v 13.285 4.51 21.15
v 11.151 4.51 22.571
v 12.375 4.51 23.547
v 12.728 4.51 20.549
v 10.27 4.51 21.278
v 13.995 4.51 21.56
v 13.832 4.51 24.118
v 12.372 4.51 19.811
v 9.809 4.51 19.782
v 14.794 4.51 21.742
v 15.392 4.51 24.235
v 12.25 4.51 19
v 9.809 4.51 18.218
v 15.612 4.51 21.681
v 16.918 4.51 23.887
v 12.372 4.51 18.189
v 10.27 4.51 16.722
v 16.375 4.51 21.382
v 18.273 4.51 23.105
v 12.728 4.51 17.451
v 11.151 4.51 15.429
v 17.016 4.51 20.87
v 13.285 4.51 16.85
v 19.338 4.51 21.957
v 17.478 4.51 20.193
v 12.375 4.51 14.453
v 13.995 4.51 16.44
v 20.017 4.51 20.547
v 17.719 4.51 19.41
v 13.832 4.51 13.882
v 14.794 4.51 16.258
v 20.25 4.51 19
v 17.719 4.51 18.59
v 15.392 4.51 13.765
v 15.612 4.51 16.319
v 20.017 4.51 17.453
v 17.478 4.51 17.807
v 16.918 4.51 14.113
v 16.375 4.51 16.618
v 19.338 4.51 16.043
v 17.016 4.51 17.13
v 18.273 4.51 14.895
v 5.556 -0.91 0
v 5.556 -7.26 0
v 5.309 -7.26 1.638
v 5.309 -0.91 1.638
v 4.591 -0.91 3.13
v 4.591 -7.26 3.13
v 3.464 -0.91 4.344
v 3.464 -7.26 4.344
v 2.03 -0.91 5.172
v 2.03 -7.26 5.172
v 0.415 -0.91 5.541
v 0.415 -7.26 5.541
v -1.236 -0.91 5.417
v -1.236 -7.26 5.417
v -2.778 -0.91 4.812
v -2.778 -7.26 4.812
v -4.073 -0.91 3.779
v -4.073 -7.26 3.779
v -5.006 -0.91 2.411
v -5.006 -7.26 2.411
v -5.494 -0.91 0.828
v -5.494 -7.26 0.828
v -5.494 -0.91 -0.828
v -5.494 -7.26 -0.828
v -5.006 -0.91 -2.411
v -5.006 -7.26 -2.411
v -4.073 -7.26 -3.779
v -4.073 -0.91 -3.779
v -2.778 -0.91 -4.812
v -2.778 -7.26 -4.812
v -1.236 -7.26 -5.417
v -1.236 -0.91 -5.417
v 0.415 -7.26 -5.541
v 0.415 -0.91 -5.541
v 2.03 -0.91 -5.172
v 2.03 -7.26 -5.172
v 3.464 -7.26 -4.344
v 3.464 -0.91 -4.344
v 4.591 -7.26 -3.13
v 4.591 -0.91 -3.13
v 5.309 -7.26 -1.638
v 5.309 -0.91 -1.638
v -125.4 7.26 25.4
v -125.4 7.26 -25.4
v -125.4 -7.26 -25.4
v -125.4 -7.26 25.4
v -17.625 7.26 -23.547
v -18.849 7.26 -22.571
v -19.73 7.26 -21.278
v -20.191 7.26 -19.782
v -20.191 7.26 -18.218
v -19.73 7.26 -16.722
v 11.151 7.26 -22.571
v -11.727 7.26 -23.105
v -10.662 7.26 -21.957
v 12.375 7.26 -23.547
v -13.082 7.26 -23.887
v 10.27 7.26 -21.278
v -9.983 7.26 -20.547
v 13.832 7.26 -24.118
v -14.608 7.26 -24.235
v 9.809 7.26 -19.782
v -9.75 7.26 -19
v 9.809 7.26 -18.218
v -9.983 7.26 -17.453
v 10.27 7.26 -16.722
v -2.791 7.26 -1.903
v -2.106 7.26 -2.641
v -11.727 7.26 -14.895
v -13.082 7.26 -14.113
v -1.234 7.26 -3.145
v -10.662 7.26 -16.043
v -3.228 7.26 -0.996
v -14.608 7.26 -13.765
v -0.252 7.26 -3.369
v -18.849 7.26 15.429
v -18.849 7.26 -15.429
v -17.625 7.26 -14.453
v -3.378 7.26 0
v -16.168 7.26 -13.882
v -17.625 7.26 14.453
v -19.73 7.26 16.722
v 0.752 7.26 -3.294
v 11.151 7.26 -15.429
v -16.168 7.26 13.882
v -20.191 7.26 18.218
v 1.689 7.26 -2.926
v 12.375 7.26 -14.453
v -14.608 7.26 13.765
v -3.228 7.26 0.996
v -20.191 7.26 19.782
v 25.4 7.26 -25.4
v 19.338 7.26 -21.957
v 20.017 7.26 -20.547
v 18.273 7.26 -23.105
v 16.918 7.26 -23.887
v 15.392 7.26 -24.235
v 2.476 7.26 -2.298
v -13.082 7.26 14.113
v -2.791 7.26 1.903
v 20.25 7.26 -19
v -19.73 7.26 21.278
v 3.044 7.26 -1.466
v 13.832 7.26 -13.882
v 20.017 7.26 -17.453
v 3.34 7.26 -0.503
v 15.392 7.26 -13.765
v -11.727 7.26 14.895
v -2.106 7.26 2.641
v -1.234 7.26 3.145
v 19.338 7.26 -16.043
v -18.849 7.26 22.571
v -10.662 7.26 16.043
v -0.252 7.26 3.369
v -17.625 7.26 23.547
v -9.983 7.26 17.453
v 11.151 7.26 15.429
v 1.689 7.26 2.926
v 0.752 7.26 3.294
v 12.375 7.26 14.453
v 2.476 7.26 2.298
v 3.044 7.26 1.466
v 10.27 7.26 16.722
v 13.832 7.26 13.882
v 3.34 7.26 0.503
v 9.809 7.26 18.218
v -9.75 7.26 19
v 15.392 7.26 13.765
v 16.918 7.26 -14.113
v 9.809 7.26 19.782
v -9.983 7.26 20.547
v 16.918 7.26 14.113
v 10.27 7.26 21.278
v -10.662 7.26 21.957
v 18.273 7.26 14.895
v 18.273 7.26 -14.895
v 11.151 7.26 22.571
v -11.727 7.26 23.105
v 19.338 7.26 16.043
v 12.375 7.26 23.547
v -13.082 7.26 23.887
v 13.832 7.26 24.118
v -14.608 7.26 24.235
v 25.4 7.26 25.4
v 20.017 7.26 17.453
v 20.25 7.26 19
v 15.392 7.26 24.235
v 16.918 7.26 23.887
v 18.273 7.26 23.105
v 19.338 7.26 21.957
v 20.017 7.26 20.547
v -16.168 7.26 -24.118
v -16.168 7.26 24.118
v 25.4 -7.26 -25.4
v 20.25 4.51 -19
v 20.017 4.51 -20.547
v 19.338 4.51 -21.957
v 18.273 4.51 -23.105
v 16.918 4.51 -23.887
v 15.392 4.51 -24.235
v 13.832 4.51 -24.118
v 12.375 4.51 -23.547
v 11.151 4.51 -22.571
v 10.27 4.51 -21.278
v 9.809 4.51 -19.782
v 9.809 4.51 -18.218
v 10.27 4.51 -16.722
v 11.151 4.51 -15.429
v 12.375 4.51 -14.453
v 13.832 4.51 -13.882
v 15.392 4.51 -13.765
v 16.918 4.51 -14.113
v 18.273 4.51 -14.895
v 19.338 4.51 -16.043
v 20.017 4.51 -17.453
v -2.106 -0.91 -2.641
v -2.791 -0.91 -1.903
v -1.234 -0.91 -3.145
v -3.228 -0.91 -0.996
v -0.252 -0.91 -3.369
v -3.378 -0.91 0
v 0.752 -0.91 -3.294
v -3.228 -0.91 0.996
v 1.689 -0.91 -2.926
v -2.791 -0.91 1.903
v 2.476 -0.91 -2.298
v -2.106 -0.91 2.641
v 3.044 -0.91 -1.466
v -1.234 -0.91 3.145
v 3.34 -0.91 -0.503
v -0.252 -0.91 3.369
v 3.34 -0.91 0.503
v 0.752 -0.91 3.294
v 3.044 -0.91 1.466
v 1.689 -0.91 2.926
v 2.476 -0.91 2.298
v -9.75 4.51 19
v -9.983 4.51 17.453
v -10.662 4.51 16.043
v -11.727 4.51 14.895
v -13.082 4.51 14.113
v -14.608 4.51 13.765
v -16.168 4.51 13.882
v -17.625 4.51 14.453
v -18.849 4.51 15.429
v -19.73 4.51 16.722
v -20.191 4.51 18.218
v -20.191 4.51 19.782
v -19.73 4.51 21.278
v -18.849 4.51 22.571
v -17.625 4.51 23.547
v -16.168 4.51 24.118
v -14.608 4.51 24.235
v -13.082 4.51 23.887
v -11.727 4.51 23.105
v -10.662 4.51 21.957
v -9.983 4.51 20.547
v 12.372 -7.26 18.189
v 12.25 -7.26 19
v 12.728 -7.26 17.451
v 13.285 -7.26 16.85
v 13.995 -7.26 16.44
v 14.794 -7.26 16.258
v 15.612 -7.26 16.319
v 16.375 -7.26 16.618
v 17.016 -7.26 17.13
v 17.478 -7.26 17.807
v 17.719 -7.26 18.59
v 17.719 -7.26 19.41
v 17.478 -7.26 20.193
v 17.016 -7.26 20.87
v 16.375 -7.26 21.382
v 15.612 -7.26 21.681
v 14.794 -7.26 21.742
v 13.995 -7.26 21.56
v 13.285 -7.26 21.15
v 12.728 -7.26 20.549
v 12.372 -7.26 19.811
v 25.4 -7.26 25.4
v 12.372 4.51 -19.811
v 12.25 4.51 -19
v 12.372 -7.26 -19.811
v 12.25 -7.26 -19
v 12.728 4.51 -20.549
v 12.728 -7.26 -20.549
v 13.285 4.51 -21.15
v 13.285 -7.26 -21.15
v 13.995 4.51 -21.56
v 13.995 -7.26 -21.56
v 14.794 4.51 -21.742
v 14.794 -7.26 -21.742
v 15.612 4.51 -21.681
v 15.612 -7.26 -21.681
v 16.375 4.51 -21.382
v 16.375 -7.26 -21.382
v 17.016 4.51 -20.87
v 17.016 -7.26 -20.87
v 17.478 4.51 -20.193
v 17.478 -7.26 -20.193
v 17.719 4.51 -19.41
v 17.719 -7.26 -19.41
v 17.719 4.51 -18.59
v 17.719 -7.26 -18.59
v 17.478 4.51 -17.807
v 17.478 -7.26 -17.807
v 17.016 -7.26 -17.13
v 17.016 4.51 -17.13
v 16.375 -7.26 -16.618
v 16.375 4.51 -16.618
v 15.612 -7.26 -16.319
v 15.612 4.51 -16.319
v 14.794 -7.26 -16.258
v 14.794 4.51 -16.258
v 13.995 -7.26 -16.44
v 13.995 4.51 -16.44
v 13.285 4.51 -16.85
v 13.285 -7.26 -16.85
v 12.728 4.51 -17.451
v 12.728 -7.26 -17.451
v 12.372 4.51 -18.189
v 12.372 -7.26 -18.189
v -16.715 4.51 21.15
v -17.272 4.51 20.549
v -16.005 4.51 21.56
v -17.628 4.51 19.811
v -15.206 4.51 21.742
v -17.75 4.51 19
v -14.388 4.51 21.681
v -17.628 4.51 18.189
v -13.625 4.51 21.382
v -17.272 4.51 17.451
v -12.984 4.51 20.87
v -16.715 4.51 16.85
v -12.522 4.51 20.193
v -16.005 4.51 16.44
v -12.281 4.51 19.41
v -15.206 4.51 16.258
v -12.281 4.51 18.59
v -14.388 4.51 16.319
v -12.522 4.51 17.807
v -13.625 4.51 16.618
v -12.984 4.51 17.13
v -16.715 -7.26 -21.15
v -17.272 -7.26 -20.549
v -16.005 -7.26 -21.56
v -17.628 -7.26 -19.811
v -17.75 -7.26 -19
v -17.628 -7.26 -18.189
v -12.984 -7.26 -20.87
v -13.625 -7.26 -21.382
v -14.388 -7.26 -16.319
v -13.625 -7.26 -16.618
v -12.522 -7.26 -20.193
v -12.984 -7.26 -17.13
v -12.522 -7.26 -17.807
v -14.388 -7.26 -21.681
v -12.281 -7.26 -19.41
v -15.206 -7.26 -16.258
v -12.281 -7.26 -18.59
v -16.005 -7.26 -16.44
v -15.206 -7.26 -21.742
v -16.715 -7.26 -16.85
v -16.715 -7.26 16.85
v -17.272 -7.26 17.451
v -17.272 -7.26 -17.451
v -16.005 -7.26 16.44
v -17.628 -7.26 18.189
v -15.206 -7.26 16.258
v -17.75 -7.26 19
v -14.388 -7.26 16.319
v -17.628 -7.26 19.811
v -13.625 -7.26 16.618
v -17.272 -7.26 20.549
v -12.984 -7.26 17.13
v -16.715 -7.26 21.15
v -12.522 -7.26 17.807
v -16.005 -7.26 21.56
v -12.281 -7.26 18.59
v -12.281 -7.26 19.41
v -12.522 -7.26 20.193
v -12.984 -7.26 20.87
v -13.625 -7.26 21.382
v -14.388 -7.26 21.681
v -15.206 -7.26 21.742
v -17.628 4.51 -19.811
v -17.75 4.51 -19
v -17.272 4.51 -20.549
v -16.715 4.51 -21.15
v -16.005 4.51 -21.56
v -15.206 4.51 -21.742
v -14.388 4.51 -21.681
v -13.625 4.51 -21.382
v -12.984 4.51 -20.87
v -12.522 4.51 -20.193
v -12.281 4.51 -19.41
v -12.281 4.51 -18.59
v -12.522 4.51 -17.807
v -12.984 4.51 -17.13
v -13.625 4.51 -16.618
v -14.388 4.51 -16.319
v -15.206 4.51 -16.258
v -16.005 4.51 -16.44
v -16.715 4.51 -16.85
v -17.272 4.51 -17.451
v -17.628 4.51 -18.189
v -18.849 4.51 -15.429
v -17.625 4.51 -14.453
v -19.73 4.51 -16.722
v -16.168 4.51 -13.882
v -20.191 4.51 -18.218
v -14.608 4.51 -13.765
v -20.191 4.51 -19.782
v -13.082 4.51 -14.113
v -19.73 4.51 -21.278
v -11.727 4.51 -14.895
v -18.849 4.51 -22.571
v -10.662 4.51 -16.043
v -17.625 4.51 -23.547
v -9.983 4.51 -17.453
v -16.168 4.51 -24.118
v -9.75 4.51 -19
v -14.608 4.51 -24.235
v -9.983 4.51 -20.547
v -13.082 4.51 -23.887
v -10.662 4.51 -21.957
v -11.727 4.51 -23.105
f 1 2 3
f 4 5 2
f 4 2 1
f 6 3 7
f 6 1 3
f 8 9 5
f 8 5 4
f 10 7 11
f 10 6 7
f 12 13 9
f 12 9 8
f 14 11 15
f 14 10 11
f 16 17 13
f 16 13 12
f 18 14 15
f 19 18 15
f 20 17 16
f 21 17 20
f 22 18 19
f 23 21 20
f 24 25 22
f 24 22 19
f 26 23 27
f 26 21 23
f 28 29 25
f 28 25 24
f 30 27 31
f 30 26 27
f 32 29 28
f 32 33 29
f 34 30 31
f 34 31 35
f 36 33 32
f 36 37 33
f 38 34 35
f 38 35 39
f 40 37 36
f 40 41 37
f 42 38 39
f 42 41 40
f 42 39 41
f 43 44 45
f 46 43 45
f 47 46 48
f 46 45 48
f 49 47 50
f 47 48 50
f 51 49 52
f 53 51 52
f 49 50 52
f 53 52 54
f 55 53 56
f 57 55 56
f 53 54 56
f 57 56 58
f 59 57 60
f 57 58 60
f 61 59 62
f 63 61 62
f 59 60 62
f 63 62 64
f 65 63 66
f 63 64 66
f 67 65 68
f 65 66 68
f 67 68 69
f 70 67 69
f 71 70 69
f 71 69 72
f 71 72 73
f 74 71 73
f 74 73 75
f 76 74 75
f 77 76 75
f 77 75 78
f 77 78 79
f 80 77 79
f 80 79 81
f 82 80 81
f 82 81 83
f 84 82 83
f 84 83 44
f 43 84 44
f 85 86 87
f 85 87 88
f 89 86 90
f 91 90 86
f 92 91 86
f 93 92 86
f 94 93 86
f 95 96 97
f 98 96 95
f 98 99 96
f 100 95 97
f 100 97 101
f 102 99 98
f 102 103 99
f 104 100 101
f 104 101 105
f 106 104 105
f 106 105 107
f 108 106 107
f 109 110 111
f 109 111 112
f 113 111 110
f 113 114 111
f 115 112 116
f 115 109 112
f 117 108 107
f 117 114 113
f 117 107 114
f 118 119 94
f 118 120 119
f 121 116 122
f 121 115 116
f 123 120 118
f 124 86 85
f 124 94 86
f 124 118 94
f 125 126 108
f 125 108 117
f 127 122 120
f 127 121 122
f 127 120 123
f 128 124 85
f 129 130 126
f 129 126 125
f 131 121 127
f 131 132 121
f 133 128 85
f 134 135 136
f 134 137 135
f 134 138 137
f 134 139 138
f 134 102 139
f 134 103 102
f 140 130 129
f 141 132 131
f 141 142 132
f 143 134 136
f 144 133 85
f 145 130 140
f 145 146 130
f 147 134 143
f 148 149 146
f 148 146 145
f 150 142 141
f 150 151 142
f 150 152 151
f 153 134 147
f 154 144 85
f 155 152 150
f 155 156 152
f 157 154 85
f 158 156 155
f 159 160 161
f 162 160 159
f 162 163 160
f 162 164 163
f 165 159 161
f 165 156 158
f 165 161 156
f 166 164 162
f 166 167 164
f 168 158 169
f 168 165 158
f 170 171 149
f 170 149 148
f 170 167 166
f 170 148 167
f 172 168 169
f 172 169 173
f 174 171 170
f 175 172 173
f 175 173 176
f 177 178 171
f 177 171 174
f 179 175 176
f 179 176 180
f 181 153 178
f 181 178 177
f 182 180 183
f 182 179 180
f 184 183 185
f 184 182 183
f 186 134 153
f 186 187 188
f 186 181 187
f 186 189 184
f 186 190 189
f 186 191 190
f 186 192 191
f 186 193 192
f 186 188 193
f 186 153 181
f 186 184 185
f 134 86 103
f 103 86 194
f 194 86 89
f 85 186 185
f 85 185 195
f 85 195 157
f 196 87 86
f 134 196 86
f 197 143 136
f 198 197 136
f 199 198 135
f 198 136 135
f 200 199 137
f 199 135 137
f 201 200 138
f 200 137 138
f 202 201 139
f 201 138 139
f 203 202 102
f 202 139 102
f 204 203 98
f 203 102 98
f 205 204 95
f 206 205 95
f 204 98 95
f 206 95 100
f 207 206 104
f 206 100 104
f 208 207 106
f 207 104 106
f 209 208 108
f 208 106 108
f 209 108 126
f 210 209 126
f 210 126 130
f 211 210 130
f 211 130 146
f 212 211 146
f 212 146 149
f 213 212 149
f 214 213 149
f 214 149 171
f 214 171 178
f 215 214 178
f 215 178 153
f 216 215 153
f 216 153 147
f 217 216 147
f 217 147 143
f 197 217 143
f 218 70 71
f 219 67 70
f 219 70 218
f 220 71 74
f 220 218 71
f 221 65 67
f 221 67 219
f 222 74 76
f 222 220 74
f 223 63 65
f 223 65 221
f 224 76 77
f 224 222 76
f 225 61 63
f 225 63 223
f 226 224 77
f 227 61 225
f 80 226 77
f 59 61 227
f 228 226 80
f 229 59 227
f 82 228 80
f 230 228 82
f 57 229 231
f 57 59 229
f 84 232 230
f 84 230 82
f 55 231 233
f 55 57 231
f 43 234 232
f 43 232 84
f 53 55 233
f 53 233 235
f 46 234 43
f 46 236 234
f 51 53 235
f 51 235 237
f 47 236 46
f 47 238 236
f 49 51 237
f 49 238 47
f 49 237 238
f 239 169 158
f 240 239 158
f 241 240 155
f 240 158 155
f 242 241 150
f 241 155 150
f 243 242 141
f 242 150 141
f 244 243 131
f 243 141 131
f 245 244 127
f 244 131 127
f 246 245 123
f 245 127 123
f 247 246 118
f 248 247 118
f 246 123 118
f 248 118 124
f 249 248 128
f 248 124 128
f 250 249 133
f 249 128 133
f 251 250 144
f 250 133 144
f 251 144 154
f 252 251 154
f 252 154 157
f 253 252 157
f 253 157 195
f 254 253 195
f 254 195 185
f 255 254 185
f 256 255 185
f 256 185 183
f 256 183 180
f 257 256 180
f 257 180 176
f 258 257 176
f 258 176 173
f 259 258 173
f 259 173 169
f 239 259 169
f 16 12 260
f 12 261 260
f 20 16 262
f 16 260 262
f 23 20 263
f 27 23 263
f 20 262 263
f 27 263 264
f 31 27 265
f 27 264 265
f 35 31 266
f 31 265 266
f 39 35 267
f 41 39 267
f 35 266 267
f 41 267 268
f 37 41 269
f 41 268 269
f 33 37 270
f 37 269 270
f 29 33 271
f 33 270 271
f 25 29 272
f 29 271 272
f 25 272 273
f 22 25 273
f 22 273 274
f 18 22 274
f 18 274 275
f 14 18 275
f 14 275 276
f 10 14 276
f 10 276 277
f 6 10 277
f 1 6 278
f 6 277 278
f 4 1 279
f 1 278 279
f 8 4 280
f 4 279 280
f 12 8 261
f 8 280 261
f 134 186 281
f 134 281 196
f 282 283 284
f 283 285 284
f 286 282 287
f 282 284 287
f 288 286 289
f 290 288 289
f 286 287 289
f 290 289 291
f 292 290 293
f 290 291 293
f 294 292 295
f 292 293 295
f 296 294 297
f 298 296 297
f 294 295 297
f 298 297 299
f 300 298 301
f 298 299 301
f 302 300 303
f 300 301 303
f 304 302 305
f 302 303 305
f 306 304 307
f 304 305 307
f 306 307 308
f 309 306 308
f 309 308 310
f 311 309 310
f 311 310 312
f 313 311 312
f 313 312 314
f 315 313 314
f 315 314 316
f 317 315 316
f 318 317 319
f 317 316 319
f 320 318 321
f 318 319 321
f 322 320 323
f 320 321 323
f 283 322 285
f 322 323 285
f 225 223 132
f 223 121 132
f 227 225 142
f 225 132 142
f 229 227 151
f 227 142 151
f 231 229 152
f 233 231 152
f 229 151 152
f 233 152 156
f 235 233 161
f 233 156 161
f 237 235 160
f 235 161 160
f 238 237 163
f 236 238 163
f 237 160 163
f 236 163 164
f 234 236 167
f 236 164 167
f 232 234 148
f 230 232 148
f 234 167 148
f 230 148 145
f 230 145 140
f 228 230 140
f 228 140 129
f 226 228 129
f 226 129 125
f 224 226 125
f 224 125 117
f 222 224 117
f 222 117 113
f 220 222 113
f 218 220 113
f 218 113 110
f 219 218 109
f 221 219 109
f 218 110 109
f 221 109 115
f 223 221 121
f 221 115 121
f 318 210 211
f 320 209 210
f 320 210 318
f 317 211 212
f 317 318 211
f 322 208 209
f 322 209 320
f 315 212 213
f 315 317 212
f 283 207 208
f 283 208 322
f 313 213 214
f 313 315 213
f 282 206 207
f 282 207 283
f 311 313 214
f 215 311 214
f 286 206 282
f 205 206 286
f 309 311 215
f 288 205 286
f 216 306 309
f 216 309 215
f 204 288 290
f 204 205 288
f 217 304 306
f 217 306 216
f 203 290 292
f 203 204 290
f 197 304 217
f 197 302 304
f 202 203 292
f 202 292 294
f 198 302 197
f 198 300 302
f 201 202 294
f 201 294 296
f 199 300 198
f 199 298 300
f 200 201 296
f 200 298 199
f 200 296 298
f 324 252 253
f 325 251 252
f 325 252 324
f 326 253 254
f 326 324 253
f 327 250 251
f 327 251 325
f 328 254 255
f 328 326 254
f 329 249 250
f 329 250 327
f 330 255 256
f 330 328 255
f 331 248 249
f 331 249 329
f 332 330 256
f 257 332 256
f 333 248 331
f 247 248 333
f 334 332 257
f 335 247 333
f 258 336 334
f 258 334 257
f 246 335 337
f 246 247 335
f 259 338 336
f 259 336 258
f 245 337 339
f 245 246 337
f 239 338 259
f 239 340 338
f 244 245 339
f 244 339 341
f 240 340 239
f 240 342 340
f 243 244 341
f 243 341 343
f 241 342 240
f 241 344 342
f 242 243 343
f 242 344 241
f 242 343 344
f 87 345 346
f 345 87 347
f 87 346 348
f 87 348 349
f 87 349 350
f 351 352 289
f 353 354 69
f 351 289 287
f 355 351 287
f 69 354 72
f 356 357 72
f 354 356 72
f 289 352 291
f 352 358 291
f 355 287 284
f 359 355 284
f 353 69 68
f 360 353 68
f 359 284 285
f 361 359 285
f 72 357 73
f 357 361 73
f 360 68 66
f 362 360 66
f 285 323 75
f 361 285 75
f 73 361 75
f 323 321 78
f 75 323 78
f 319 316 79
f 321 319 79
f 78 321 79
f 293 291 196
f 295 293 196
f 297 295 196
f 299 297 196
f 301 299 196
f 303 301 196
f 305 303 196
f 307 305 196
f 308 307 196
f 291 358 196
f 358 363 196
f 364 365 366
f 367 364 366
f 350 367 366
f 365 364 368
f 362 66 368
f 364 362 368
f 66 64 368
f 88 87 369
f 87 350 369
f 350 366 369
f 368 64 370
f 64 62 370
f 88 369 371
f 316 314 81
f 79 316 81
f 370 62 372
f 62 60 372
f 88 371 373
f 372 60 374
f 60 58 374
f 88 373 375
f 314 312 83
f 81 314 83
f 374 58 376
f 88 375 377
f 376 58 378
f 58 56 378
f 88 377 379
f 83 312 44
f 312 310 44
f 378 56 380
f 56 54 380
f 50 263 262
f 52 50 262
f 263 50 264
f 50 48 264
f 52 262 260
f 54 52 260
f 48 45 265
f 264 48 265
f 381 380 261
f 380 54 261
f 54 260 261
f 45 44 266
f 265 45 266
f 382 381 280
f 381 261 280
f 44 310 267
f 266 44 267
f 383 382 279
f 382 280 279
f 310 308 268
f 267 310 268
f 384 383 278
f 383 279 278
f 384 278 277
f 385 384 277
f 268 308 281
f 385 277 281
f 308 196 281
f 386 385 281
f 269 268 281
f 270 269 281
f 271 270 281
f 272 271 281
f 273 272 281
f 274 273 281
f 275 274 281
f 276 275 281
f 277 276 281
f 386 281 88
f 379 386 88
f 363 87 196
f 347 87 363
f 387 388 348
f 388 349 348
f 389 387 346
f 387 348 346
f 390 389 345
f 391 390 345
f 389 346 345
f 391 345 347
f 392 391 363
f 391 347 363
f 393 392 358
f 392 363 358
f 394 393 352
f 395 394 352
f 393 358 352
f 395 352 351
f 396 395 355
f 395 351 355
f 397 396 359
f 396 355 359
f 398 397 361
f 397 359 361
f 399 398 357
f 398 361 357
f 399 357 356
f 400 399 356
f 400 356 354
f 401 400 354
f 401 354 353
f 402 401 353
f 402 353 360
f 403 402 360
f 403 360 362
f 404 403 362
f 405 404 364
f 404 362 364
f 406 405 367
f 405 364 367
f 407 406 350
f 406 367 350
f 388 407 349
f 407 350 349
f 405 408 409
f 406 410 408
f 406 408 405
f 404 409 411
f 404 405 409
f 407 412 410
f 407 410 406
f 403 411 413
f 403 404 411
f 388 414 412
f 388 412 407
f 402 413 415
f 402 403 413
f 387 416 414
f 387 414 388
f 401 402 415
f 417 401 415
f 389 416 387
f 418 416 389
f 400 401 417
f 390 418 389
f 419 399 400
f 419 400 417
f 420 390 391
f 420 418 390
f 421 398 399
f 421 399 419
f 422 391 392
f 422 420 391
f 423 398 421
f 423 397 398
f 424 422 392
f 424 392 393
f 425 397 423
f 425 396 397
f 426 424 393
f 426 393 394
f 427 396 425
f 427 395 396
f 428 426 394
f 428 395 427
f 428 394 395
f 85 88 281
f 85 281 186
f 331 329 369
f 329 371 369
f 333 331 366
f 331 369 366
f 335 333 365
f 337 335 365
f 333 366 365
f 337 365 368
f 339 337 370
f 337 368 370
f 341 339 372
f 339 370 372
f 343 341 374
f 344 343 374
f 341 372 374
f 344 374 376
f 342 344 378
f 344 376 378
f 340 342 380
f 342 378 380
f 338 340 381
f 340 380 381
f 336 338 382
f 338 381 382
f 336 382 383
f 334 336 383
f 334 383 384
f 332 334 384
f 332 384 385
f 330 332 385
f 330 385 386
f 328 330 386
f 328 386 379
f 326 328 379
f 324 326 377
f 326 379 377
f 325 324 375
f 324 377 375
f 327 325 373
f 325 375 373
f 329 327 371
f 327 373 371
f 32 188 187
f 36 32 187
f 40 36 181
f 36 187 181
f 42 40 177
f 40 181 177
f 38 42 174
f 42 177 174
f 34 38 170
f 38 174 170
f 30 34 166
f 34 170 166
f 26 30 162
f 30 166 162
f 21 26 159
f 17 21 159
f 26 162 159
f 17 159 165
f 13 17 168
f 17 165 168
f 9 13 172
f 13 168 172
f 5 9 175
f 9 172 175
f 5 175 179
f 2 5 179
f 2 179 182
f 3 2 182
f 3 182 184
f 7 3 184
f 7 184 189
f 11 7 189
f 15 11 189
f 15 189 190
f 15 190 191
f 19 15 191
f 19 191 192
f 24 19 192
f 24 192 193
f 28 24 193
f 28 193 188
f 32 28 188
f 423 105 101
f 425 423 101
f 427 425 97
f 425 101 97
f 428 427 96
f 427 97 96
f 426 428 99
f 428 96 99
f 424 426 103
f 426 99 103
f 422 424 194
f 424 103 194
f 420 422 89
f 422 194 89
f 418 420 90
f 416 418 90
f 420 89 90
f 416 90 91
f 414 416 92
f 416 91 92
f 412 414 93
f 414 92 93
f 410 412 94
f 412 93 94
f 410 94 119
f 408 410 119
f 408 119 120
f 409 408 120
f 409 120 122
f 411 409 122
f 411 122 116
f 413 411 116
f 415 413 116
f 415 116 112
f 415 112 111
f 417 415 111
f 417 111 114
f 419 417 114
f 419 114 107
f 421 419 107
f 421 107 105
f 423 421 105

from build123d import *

# Parameters (mm, degrees)
SKETCH1_W                                        = 50.8
SKETCH1_H                                        = 50.8
BOSS_EXTRUDE1_DEPTH                              = 7.26
CBORE_FOR_M5_SBHCS1_D                            = 5.5
CBORE_FOR_M5_SBHCS1_CBORE_D                      = 10.5
CBORE_FOR_M5_SBHCS1_CBORE_DEPTH                  = 2.75
CBORE_FOR_1_4_SOCKET_HEAD_CAP_SCREW1_D           = 6.7564
CBORE_FOR_1_4_SOCKET_HEAD_CAP_SCREW1_CBORE_D     = 11.1125
CBORE_FOR_1_4_SOCKET_HEAD_CAP_SCREW1_CBORE_DEPTH = 6.35
SKETCH6_W                                        = 50.8
SKETCH6_H                                        = 14.52
BOSS_EXTRUDE2_DEPTH                              = 100


with BuildPart() as part:
    # Sketch1 → Boss-Extrude1 (new, symmetric)
    with BuildSketch(Plane(origin=(0, 0, 0), x_dir=(1, 0, 0), z_dir=(0, 1, 0))):
        Rectangle(SKETCH1_W, SKETCH1_H)
    extrude(amount=BOSS_EXTRUDE1_DEPTH, both=True)

    # CBORE for M5 SBHCS1 (through all)
    with Locations(Plane(origin=(0, 7.26, 0), x_dir=(1, 0, 0), z_dir=(0, 1, 0))):
        with Locations((-15, 19), (-15, -19), (15, -19), (15, 19)):
            CounterBoreHole(CBORE_FOR_M5_SBHCS1_D / 2, CBORE_FOR_M5_SBHCS1_CBORE_D / 2, CBORE_FOR_M5_SBHCS1_CBORE_DEPTH)

    # CBORE for 1/4 Socket Head Cap Screw1 (through all)
    with Locations(Plane.XZ.offset(7.26)):
        with Locations((0, 0)):
            CounterBoreHole(CBORE_FOR_1_4_SOCKET_HEAD_CAP_SCREW1_D / 2, CBORE_FOR_1_4_SOCKET_HEAD_CAP_SCREW1_CBORE_D / 2, CBORE_FOR_1_4_SOCKET_HEAD_CAP_SCREW1_CBORE_DEPTH)

    # Sketch6 → Boss-Extrude2 (add)
    with BuildSketch(Plane.ZY.offset(25.4)):
        Rectangle(SKETCH6_W, SKETCH6_H)
    extrude(amount=BOSS_EXTRUDE2_DEPTH)


solid = part.part
